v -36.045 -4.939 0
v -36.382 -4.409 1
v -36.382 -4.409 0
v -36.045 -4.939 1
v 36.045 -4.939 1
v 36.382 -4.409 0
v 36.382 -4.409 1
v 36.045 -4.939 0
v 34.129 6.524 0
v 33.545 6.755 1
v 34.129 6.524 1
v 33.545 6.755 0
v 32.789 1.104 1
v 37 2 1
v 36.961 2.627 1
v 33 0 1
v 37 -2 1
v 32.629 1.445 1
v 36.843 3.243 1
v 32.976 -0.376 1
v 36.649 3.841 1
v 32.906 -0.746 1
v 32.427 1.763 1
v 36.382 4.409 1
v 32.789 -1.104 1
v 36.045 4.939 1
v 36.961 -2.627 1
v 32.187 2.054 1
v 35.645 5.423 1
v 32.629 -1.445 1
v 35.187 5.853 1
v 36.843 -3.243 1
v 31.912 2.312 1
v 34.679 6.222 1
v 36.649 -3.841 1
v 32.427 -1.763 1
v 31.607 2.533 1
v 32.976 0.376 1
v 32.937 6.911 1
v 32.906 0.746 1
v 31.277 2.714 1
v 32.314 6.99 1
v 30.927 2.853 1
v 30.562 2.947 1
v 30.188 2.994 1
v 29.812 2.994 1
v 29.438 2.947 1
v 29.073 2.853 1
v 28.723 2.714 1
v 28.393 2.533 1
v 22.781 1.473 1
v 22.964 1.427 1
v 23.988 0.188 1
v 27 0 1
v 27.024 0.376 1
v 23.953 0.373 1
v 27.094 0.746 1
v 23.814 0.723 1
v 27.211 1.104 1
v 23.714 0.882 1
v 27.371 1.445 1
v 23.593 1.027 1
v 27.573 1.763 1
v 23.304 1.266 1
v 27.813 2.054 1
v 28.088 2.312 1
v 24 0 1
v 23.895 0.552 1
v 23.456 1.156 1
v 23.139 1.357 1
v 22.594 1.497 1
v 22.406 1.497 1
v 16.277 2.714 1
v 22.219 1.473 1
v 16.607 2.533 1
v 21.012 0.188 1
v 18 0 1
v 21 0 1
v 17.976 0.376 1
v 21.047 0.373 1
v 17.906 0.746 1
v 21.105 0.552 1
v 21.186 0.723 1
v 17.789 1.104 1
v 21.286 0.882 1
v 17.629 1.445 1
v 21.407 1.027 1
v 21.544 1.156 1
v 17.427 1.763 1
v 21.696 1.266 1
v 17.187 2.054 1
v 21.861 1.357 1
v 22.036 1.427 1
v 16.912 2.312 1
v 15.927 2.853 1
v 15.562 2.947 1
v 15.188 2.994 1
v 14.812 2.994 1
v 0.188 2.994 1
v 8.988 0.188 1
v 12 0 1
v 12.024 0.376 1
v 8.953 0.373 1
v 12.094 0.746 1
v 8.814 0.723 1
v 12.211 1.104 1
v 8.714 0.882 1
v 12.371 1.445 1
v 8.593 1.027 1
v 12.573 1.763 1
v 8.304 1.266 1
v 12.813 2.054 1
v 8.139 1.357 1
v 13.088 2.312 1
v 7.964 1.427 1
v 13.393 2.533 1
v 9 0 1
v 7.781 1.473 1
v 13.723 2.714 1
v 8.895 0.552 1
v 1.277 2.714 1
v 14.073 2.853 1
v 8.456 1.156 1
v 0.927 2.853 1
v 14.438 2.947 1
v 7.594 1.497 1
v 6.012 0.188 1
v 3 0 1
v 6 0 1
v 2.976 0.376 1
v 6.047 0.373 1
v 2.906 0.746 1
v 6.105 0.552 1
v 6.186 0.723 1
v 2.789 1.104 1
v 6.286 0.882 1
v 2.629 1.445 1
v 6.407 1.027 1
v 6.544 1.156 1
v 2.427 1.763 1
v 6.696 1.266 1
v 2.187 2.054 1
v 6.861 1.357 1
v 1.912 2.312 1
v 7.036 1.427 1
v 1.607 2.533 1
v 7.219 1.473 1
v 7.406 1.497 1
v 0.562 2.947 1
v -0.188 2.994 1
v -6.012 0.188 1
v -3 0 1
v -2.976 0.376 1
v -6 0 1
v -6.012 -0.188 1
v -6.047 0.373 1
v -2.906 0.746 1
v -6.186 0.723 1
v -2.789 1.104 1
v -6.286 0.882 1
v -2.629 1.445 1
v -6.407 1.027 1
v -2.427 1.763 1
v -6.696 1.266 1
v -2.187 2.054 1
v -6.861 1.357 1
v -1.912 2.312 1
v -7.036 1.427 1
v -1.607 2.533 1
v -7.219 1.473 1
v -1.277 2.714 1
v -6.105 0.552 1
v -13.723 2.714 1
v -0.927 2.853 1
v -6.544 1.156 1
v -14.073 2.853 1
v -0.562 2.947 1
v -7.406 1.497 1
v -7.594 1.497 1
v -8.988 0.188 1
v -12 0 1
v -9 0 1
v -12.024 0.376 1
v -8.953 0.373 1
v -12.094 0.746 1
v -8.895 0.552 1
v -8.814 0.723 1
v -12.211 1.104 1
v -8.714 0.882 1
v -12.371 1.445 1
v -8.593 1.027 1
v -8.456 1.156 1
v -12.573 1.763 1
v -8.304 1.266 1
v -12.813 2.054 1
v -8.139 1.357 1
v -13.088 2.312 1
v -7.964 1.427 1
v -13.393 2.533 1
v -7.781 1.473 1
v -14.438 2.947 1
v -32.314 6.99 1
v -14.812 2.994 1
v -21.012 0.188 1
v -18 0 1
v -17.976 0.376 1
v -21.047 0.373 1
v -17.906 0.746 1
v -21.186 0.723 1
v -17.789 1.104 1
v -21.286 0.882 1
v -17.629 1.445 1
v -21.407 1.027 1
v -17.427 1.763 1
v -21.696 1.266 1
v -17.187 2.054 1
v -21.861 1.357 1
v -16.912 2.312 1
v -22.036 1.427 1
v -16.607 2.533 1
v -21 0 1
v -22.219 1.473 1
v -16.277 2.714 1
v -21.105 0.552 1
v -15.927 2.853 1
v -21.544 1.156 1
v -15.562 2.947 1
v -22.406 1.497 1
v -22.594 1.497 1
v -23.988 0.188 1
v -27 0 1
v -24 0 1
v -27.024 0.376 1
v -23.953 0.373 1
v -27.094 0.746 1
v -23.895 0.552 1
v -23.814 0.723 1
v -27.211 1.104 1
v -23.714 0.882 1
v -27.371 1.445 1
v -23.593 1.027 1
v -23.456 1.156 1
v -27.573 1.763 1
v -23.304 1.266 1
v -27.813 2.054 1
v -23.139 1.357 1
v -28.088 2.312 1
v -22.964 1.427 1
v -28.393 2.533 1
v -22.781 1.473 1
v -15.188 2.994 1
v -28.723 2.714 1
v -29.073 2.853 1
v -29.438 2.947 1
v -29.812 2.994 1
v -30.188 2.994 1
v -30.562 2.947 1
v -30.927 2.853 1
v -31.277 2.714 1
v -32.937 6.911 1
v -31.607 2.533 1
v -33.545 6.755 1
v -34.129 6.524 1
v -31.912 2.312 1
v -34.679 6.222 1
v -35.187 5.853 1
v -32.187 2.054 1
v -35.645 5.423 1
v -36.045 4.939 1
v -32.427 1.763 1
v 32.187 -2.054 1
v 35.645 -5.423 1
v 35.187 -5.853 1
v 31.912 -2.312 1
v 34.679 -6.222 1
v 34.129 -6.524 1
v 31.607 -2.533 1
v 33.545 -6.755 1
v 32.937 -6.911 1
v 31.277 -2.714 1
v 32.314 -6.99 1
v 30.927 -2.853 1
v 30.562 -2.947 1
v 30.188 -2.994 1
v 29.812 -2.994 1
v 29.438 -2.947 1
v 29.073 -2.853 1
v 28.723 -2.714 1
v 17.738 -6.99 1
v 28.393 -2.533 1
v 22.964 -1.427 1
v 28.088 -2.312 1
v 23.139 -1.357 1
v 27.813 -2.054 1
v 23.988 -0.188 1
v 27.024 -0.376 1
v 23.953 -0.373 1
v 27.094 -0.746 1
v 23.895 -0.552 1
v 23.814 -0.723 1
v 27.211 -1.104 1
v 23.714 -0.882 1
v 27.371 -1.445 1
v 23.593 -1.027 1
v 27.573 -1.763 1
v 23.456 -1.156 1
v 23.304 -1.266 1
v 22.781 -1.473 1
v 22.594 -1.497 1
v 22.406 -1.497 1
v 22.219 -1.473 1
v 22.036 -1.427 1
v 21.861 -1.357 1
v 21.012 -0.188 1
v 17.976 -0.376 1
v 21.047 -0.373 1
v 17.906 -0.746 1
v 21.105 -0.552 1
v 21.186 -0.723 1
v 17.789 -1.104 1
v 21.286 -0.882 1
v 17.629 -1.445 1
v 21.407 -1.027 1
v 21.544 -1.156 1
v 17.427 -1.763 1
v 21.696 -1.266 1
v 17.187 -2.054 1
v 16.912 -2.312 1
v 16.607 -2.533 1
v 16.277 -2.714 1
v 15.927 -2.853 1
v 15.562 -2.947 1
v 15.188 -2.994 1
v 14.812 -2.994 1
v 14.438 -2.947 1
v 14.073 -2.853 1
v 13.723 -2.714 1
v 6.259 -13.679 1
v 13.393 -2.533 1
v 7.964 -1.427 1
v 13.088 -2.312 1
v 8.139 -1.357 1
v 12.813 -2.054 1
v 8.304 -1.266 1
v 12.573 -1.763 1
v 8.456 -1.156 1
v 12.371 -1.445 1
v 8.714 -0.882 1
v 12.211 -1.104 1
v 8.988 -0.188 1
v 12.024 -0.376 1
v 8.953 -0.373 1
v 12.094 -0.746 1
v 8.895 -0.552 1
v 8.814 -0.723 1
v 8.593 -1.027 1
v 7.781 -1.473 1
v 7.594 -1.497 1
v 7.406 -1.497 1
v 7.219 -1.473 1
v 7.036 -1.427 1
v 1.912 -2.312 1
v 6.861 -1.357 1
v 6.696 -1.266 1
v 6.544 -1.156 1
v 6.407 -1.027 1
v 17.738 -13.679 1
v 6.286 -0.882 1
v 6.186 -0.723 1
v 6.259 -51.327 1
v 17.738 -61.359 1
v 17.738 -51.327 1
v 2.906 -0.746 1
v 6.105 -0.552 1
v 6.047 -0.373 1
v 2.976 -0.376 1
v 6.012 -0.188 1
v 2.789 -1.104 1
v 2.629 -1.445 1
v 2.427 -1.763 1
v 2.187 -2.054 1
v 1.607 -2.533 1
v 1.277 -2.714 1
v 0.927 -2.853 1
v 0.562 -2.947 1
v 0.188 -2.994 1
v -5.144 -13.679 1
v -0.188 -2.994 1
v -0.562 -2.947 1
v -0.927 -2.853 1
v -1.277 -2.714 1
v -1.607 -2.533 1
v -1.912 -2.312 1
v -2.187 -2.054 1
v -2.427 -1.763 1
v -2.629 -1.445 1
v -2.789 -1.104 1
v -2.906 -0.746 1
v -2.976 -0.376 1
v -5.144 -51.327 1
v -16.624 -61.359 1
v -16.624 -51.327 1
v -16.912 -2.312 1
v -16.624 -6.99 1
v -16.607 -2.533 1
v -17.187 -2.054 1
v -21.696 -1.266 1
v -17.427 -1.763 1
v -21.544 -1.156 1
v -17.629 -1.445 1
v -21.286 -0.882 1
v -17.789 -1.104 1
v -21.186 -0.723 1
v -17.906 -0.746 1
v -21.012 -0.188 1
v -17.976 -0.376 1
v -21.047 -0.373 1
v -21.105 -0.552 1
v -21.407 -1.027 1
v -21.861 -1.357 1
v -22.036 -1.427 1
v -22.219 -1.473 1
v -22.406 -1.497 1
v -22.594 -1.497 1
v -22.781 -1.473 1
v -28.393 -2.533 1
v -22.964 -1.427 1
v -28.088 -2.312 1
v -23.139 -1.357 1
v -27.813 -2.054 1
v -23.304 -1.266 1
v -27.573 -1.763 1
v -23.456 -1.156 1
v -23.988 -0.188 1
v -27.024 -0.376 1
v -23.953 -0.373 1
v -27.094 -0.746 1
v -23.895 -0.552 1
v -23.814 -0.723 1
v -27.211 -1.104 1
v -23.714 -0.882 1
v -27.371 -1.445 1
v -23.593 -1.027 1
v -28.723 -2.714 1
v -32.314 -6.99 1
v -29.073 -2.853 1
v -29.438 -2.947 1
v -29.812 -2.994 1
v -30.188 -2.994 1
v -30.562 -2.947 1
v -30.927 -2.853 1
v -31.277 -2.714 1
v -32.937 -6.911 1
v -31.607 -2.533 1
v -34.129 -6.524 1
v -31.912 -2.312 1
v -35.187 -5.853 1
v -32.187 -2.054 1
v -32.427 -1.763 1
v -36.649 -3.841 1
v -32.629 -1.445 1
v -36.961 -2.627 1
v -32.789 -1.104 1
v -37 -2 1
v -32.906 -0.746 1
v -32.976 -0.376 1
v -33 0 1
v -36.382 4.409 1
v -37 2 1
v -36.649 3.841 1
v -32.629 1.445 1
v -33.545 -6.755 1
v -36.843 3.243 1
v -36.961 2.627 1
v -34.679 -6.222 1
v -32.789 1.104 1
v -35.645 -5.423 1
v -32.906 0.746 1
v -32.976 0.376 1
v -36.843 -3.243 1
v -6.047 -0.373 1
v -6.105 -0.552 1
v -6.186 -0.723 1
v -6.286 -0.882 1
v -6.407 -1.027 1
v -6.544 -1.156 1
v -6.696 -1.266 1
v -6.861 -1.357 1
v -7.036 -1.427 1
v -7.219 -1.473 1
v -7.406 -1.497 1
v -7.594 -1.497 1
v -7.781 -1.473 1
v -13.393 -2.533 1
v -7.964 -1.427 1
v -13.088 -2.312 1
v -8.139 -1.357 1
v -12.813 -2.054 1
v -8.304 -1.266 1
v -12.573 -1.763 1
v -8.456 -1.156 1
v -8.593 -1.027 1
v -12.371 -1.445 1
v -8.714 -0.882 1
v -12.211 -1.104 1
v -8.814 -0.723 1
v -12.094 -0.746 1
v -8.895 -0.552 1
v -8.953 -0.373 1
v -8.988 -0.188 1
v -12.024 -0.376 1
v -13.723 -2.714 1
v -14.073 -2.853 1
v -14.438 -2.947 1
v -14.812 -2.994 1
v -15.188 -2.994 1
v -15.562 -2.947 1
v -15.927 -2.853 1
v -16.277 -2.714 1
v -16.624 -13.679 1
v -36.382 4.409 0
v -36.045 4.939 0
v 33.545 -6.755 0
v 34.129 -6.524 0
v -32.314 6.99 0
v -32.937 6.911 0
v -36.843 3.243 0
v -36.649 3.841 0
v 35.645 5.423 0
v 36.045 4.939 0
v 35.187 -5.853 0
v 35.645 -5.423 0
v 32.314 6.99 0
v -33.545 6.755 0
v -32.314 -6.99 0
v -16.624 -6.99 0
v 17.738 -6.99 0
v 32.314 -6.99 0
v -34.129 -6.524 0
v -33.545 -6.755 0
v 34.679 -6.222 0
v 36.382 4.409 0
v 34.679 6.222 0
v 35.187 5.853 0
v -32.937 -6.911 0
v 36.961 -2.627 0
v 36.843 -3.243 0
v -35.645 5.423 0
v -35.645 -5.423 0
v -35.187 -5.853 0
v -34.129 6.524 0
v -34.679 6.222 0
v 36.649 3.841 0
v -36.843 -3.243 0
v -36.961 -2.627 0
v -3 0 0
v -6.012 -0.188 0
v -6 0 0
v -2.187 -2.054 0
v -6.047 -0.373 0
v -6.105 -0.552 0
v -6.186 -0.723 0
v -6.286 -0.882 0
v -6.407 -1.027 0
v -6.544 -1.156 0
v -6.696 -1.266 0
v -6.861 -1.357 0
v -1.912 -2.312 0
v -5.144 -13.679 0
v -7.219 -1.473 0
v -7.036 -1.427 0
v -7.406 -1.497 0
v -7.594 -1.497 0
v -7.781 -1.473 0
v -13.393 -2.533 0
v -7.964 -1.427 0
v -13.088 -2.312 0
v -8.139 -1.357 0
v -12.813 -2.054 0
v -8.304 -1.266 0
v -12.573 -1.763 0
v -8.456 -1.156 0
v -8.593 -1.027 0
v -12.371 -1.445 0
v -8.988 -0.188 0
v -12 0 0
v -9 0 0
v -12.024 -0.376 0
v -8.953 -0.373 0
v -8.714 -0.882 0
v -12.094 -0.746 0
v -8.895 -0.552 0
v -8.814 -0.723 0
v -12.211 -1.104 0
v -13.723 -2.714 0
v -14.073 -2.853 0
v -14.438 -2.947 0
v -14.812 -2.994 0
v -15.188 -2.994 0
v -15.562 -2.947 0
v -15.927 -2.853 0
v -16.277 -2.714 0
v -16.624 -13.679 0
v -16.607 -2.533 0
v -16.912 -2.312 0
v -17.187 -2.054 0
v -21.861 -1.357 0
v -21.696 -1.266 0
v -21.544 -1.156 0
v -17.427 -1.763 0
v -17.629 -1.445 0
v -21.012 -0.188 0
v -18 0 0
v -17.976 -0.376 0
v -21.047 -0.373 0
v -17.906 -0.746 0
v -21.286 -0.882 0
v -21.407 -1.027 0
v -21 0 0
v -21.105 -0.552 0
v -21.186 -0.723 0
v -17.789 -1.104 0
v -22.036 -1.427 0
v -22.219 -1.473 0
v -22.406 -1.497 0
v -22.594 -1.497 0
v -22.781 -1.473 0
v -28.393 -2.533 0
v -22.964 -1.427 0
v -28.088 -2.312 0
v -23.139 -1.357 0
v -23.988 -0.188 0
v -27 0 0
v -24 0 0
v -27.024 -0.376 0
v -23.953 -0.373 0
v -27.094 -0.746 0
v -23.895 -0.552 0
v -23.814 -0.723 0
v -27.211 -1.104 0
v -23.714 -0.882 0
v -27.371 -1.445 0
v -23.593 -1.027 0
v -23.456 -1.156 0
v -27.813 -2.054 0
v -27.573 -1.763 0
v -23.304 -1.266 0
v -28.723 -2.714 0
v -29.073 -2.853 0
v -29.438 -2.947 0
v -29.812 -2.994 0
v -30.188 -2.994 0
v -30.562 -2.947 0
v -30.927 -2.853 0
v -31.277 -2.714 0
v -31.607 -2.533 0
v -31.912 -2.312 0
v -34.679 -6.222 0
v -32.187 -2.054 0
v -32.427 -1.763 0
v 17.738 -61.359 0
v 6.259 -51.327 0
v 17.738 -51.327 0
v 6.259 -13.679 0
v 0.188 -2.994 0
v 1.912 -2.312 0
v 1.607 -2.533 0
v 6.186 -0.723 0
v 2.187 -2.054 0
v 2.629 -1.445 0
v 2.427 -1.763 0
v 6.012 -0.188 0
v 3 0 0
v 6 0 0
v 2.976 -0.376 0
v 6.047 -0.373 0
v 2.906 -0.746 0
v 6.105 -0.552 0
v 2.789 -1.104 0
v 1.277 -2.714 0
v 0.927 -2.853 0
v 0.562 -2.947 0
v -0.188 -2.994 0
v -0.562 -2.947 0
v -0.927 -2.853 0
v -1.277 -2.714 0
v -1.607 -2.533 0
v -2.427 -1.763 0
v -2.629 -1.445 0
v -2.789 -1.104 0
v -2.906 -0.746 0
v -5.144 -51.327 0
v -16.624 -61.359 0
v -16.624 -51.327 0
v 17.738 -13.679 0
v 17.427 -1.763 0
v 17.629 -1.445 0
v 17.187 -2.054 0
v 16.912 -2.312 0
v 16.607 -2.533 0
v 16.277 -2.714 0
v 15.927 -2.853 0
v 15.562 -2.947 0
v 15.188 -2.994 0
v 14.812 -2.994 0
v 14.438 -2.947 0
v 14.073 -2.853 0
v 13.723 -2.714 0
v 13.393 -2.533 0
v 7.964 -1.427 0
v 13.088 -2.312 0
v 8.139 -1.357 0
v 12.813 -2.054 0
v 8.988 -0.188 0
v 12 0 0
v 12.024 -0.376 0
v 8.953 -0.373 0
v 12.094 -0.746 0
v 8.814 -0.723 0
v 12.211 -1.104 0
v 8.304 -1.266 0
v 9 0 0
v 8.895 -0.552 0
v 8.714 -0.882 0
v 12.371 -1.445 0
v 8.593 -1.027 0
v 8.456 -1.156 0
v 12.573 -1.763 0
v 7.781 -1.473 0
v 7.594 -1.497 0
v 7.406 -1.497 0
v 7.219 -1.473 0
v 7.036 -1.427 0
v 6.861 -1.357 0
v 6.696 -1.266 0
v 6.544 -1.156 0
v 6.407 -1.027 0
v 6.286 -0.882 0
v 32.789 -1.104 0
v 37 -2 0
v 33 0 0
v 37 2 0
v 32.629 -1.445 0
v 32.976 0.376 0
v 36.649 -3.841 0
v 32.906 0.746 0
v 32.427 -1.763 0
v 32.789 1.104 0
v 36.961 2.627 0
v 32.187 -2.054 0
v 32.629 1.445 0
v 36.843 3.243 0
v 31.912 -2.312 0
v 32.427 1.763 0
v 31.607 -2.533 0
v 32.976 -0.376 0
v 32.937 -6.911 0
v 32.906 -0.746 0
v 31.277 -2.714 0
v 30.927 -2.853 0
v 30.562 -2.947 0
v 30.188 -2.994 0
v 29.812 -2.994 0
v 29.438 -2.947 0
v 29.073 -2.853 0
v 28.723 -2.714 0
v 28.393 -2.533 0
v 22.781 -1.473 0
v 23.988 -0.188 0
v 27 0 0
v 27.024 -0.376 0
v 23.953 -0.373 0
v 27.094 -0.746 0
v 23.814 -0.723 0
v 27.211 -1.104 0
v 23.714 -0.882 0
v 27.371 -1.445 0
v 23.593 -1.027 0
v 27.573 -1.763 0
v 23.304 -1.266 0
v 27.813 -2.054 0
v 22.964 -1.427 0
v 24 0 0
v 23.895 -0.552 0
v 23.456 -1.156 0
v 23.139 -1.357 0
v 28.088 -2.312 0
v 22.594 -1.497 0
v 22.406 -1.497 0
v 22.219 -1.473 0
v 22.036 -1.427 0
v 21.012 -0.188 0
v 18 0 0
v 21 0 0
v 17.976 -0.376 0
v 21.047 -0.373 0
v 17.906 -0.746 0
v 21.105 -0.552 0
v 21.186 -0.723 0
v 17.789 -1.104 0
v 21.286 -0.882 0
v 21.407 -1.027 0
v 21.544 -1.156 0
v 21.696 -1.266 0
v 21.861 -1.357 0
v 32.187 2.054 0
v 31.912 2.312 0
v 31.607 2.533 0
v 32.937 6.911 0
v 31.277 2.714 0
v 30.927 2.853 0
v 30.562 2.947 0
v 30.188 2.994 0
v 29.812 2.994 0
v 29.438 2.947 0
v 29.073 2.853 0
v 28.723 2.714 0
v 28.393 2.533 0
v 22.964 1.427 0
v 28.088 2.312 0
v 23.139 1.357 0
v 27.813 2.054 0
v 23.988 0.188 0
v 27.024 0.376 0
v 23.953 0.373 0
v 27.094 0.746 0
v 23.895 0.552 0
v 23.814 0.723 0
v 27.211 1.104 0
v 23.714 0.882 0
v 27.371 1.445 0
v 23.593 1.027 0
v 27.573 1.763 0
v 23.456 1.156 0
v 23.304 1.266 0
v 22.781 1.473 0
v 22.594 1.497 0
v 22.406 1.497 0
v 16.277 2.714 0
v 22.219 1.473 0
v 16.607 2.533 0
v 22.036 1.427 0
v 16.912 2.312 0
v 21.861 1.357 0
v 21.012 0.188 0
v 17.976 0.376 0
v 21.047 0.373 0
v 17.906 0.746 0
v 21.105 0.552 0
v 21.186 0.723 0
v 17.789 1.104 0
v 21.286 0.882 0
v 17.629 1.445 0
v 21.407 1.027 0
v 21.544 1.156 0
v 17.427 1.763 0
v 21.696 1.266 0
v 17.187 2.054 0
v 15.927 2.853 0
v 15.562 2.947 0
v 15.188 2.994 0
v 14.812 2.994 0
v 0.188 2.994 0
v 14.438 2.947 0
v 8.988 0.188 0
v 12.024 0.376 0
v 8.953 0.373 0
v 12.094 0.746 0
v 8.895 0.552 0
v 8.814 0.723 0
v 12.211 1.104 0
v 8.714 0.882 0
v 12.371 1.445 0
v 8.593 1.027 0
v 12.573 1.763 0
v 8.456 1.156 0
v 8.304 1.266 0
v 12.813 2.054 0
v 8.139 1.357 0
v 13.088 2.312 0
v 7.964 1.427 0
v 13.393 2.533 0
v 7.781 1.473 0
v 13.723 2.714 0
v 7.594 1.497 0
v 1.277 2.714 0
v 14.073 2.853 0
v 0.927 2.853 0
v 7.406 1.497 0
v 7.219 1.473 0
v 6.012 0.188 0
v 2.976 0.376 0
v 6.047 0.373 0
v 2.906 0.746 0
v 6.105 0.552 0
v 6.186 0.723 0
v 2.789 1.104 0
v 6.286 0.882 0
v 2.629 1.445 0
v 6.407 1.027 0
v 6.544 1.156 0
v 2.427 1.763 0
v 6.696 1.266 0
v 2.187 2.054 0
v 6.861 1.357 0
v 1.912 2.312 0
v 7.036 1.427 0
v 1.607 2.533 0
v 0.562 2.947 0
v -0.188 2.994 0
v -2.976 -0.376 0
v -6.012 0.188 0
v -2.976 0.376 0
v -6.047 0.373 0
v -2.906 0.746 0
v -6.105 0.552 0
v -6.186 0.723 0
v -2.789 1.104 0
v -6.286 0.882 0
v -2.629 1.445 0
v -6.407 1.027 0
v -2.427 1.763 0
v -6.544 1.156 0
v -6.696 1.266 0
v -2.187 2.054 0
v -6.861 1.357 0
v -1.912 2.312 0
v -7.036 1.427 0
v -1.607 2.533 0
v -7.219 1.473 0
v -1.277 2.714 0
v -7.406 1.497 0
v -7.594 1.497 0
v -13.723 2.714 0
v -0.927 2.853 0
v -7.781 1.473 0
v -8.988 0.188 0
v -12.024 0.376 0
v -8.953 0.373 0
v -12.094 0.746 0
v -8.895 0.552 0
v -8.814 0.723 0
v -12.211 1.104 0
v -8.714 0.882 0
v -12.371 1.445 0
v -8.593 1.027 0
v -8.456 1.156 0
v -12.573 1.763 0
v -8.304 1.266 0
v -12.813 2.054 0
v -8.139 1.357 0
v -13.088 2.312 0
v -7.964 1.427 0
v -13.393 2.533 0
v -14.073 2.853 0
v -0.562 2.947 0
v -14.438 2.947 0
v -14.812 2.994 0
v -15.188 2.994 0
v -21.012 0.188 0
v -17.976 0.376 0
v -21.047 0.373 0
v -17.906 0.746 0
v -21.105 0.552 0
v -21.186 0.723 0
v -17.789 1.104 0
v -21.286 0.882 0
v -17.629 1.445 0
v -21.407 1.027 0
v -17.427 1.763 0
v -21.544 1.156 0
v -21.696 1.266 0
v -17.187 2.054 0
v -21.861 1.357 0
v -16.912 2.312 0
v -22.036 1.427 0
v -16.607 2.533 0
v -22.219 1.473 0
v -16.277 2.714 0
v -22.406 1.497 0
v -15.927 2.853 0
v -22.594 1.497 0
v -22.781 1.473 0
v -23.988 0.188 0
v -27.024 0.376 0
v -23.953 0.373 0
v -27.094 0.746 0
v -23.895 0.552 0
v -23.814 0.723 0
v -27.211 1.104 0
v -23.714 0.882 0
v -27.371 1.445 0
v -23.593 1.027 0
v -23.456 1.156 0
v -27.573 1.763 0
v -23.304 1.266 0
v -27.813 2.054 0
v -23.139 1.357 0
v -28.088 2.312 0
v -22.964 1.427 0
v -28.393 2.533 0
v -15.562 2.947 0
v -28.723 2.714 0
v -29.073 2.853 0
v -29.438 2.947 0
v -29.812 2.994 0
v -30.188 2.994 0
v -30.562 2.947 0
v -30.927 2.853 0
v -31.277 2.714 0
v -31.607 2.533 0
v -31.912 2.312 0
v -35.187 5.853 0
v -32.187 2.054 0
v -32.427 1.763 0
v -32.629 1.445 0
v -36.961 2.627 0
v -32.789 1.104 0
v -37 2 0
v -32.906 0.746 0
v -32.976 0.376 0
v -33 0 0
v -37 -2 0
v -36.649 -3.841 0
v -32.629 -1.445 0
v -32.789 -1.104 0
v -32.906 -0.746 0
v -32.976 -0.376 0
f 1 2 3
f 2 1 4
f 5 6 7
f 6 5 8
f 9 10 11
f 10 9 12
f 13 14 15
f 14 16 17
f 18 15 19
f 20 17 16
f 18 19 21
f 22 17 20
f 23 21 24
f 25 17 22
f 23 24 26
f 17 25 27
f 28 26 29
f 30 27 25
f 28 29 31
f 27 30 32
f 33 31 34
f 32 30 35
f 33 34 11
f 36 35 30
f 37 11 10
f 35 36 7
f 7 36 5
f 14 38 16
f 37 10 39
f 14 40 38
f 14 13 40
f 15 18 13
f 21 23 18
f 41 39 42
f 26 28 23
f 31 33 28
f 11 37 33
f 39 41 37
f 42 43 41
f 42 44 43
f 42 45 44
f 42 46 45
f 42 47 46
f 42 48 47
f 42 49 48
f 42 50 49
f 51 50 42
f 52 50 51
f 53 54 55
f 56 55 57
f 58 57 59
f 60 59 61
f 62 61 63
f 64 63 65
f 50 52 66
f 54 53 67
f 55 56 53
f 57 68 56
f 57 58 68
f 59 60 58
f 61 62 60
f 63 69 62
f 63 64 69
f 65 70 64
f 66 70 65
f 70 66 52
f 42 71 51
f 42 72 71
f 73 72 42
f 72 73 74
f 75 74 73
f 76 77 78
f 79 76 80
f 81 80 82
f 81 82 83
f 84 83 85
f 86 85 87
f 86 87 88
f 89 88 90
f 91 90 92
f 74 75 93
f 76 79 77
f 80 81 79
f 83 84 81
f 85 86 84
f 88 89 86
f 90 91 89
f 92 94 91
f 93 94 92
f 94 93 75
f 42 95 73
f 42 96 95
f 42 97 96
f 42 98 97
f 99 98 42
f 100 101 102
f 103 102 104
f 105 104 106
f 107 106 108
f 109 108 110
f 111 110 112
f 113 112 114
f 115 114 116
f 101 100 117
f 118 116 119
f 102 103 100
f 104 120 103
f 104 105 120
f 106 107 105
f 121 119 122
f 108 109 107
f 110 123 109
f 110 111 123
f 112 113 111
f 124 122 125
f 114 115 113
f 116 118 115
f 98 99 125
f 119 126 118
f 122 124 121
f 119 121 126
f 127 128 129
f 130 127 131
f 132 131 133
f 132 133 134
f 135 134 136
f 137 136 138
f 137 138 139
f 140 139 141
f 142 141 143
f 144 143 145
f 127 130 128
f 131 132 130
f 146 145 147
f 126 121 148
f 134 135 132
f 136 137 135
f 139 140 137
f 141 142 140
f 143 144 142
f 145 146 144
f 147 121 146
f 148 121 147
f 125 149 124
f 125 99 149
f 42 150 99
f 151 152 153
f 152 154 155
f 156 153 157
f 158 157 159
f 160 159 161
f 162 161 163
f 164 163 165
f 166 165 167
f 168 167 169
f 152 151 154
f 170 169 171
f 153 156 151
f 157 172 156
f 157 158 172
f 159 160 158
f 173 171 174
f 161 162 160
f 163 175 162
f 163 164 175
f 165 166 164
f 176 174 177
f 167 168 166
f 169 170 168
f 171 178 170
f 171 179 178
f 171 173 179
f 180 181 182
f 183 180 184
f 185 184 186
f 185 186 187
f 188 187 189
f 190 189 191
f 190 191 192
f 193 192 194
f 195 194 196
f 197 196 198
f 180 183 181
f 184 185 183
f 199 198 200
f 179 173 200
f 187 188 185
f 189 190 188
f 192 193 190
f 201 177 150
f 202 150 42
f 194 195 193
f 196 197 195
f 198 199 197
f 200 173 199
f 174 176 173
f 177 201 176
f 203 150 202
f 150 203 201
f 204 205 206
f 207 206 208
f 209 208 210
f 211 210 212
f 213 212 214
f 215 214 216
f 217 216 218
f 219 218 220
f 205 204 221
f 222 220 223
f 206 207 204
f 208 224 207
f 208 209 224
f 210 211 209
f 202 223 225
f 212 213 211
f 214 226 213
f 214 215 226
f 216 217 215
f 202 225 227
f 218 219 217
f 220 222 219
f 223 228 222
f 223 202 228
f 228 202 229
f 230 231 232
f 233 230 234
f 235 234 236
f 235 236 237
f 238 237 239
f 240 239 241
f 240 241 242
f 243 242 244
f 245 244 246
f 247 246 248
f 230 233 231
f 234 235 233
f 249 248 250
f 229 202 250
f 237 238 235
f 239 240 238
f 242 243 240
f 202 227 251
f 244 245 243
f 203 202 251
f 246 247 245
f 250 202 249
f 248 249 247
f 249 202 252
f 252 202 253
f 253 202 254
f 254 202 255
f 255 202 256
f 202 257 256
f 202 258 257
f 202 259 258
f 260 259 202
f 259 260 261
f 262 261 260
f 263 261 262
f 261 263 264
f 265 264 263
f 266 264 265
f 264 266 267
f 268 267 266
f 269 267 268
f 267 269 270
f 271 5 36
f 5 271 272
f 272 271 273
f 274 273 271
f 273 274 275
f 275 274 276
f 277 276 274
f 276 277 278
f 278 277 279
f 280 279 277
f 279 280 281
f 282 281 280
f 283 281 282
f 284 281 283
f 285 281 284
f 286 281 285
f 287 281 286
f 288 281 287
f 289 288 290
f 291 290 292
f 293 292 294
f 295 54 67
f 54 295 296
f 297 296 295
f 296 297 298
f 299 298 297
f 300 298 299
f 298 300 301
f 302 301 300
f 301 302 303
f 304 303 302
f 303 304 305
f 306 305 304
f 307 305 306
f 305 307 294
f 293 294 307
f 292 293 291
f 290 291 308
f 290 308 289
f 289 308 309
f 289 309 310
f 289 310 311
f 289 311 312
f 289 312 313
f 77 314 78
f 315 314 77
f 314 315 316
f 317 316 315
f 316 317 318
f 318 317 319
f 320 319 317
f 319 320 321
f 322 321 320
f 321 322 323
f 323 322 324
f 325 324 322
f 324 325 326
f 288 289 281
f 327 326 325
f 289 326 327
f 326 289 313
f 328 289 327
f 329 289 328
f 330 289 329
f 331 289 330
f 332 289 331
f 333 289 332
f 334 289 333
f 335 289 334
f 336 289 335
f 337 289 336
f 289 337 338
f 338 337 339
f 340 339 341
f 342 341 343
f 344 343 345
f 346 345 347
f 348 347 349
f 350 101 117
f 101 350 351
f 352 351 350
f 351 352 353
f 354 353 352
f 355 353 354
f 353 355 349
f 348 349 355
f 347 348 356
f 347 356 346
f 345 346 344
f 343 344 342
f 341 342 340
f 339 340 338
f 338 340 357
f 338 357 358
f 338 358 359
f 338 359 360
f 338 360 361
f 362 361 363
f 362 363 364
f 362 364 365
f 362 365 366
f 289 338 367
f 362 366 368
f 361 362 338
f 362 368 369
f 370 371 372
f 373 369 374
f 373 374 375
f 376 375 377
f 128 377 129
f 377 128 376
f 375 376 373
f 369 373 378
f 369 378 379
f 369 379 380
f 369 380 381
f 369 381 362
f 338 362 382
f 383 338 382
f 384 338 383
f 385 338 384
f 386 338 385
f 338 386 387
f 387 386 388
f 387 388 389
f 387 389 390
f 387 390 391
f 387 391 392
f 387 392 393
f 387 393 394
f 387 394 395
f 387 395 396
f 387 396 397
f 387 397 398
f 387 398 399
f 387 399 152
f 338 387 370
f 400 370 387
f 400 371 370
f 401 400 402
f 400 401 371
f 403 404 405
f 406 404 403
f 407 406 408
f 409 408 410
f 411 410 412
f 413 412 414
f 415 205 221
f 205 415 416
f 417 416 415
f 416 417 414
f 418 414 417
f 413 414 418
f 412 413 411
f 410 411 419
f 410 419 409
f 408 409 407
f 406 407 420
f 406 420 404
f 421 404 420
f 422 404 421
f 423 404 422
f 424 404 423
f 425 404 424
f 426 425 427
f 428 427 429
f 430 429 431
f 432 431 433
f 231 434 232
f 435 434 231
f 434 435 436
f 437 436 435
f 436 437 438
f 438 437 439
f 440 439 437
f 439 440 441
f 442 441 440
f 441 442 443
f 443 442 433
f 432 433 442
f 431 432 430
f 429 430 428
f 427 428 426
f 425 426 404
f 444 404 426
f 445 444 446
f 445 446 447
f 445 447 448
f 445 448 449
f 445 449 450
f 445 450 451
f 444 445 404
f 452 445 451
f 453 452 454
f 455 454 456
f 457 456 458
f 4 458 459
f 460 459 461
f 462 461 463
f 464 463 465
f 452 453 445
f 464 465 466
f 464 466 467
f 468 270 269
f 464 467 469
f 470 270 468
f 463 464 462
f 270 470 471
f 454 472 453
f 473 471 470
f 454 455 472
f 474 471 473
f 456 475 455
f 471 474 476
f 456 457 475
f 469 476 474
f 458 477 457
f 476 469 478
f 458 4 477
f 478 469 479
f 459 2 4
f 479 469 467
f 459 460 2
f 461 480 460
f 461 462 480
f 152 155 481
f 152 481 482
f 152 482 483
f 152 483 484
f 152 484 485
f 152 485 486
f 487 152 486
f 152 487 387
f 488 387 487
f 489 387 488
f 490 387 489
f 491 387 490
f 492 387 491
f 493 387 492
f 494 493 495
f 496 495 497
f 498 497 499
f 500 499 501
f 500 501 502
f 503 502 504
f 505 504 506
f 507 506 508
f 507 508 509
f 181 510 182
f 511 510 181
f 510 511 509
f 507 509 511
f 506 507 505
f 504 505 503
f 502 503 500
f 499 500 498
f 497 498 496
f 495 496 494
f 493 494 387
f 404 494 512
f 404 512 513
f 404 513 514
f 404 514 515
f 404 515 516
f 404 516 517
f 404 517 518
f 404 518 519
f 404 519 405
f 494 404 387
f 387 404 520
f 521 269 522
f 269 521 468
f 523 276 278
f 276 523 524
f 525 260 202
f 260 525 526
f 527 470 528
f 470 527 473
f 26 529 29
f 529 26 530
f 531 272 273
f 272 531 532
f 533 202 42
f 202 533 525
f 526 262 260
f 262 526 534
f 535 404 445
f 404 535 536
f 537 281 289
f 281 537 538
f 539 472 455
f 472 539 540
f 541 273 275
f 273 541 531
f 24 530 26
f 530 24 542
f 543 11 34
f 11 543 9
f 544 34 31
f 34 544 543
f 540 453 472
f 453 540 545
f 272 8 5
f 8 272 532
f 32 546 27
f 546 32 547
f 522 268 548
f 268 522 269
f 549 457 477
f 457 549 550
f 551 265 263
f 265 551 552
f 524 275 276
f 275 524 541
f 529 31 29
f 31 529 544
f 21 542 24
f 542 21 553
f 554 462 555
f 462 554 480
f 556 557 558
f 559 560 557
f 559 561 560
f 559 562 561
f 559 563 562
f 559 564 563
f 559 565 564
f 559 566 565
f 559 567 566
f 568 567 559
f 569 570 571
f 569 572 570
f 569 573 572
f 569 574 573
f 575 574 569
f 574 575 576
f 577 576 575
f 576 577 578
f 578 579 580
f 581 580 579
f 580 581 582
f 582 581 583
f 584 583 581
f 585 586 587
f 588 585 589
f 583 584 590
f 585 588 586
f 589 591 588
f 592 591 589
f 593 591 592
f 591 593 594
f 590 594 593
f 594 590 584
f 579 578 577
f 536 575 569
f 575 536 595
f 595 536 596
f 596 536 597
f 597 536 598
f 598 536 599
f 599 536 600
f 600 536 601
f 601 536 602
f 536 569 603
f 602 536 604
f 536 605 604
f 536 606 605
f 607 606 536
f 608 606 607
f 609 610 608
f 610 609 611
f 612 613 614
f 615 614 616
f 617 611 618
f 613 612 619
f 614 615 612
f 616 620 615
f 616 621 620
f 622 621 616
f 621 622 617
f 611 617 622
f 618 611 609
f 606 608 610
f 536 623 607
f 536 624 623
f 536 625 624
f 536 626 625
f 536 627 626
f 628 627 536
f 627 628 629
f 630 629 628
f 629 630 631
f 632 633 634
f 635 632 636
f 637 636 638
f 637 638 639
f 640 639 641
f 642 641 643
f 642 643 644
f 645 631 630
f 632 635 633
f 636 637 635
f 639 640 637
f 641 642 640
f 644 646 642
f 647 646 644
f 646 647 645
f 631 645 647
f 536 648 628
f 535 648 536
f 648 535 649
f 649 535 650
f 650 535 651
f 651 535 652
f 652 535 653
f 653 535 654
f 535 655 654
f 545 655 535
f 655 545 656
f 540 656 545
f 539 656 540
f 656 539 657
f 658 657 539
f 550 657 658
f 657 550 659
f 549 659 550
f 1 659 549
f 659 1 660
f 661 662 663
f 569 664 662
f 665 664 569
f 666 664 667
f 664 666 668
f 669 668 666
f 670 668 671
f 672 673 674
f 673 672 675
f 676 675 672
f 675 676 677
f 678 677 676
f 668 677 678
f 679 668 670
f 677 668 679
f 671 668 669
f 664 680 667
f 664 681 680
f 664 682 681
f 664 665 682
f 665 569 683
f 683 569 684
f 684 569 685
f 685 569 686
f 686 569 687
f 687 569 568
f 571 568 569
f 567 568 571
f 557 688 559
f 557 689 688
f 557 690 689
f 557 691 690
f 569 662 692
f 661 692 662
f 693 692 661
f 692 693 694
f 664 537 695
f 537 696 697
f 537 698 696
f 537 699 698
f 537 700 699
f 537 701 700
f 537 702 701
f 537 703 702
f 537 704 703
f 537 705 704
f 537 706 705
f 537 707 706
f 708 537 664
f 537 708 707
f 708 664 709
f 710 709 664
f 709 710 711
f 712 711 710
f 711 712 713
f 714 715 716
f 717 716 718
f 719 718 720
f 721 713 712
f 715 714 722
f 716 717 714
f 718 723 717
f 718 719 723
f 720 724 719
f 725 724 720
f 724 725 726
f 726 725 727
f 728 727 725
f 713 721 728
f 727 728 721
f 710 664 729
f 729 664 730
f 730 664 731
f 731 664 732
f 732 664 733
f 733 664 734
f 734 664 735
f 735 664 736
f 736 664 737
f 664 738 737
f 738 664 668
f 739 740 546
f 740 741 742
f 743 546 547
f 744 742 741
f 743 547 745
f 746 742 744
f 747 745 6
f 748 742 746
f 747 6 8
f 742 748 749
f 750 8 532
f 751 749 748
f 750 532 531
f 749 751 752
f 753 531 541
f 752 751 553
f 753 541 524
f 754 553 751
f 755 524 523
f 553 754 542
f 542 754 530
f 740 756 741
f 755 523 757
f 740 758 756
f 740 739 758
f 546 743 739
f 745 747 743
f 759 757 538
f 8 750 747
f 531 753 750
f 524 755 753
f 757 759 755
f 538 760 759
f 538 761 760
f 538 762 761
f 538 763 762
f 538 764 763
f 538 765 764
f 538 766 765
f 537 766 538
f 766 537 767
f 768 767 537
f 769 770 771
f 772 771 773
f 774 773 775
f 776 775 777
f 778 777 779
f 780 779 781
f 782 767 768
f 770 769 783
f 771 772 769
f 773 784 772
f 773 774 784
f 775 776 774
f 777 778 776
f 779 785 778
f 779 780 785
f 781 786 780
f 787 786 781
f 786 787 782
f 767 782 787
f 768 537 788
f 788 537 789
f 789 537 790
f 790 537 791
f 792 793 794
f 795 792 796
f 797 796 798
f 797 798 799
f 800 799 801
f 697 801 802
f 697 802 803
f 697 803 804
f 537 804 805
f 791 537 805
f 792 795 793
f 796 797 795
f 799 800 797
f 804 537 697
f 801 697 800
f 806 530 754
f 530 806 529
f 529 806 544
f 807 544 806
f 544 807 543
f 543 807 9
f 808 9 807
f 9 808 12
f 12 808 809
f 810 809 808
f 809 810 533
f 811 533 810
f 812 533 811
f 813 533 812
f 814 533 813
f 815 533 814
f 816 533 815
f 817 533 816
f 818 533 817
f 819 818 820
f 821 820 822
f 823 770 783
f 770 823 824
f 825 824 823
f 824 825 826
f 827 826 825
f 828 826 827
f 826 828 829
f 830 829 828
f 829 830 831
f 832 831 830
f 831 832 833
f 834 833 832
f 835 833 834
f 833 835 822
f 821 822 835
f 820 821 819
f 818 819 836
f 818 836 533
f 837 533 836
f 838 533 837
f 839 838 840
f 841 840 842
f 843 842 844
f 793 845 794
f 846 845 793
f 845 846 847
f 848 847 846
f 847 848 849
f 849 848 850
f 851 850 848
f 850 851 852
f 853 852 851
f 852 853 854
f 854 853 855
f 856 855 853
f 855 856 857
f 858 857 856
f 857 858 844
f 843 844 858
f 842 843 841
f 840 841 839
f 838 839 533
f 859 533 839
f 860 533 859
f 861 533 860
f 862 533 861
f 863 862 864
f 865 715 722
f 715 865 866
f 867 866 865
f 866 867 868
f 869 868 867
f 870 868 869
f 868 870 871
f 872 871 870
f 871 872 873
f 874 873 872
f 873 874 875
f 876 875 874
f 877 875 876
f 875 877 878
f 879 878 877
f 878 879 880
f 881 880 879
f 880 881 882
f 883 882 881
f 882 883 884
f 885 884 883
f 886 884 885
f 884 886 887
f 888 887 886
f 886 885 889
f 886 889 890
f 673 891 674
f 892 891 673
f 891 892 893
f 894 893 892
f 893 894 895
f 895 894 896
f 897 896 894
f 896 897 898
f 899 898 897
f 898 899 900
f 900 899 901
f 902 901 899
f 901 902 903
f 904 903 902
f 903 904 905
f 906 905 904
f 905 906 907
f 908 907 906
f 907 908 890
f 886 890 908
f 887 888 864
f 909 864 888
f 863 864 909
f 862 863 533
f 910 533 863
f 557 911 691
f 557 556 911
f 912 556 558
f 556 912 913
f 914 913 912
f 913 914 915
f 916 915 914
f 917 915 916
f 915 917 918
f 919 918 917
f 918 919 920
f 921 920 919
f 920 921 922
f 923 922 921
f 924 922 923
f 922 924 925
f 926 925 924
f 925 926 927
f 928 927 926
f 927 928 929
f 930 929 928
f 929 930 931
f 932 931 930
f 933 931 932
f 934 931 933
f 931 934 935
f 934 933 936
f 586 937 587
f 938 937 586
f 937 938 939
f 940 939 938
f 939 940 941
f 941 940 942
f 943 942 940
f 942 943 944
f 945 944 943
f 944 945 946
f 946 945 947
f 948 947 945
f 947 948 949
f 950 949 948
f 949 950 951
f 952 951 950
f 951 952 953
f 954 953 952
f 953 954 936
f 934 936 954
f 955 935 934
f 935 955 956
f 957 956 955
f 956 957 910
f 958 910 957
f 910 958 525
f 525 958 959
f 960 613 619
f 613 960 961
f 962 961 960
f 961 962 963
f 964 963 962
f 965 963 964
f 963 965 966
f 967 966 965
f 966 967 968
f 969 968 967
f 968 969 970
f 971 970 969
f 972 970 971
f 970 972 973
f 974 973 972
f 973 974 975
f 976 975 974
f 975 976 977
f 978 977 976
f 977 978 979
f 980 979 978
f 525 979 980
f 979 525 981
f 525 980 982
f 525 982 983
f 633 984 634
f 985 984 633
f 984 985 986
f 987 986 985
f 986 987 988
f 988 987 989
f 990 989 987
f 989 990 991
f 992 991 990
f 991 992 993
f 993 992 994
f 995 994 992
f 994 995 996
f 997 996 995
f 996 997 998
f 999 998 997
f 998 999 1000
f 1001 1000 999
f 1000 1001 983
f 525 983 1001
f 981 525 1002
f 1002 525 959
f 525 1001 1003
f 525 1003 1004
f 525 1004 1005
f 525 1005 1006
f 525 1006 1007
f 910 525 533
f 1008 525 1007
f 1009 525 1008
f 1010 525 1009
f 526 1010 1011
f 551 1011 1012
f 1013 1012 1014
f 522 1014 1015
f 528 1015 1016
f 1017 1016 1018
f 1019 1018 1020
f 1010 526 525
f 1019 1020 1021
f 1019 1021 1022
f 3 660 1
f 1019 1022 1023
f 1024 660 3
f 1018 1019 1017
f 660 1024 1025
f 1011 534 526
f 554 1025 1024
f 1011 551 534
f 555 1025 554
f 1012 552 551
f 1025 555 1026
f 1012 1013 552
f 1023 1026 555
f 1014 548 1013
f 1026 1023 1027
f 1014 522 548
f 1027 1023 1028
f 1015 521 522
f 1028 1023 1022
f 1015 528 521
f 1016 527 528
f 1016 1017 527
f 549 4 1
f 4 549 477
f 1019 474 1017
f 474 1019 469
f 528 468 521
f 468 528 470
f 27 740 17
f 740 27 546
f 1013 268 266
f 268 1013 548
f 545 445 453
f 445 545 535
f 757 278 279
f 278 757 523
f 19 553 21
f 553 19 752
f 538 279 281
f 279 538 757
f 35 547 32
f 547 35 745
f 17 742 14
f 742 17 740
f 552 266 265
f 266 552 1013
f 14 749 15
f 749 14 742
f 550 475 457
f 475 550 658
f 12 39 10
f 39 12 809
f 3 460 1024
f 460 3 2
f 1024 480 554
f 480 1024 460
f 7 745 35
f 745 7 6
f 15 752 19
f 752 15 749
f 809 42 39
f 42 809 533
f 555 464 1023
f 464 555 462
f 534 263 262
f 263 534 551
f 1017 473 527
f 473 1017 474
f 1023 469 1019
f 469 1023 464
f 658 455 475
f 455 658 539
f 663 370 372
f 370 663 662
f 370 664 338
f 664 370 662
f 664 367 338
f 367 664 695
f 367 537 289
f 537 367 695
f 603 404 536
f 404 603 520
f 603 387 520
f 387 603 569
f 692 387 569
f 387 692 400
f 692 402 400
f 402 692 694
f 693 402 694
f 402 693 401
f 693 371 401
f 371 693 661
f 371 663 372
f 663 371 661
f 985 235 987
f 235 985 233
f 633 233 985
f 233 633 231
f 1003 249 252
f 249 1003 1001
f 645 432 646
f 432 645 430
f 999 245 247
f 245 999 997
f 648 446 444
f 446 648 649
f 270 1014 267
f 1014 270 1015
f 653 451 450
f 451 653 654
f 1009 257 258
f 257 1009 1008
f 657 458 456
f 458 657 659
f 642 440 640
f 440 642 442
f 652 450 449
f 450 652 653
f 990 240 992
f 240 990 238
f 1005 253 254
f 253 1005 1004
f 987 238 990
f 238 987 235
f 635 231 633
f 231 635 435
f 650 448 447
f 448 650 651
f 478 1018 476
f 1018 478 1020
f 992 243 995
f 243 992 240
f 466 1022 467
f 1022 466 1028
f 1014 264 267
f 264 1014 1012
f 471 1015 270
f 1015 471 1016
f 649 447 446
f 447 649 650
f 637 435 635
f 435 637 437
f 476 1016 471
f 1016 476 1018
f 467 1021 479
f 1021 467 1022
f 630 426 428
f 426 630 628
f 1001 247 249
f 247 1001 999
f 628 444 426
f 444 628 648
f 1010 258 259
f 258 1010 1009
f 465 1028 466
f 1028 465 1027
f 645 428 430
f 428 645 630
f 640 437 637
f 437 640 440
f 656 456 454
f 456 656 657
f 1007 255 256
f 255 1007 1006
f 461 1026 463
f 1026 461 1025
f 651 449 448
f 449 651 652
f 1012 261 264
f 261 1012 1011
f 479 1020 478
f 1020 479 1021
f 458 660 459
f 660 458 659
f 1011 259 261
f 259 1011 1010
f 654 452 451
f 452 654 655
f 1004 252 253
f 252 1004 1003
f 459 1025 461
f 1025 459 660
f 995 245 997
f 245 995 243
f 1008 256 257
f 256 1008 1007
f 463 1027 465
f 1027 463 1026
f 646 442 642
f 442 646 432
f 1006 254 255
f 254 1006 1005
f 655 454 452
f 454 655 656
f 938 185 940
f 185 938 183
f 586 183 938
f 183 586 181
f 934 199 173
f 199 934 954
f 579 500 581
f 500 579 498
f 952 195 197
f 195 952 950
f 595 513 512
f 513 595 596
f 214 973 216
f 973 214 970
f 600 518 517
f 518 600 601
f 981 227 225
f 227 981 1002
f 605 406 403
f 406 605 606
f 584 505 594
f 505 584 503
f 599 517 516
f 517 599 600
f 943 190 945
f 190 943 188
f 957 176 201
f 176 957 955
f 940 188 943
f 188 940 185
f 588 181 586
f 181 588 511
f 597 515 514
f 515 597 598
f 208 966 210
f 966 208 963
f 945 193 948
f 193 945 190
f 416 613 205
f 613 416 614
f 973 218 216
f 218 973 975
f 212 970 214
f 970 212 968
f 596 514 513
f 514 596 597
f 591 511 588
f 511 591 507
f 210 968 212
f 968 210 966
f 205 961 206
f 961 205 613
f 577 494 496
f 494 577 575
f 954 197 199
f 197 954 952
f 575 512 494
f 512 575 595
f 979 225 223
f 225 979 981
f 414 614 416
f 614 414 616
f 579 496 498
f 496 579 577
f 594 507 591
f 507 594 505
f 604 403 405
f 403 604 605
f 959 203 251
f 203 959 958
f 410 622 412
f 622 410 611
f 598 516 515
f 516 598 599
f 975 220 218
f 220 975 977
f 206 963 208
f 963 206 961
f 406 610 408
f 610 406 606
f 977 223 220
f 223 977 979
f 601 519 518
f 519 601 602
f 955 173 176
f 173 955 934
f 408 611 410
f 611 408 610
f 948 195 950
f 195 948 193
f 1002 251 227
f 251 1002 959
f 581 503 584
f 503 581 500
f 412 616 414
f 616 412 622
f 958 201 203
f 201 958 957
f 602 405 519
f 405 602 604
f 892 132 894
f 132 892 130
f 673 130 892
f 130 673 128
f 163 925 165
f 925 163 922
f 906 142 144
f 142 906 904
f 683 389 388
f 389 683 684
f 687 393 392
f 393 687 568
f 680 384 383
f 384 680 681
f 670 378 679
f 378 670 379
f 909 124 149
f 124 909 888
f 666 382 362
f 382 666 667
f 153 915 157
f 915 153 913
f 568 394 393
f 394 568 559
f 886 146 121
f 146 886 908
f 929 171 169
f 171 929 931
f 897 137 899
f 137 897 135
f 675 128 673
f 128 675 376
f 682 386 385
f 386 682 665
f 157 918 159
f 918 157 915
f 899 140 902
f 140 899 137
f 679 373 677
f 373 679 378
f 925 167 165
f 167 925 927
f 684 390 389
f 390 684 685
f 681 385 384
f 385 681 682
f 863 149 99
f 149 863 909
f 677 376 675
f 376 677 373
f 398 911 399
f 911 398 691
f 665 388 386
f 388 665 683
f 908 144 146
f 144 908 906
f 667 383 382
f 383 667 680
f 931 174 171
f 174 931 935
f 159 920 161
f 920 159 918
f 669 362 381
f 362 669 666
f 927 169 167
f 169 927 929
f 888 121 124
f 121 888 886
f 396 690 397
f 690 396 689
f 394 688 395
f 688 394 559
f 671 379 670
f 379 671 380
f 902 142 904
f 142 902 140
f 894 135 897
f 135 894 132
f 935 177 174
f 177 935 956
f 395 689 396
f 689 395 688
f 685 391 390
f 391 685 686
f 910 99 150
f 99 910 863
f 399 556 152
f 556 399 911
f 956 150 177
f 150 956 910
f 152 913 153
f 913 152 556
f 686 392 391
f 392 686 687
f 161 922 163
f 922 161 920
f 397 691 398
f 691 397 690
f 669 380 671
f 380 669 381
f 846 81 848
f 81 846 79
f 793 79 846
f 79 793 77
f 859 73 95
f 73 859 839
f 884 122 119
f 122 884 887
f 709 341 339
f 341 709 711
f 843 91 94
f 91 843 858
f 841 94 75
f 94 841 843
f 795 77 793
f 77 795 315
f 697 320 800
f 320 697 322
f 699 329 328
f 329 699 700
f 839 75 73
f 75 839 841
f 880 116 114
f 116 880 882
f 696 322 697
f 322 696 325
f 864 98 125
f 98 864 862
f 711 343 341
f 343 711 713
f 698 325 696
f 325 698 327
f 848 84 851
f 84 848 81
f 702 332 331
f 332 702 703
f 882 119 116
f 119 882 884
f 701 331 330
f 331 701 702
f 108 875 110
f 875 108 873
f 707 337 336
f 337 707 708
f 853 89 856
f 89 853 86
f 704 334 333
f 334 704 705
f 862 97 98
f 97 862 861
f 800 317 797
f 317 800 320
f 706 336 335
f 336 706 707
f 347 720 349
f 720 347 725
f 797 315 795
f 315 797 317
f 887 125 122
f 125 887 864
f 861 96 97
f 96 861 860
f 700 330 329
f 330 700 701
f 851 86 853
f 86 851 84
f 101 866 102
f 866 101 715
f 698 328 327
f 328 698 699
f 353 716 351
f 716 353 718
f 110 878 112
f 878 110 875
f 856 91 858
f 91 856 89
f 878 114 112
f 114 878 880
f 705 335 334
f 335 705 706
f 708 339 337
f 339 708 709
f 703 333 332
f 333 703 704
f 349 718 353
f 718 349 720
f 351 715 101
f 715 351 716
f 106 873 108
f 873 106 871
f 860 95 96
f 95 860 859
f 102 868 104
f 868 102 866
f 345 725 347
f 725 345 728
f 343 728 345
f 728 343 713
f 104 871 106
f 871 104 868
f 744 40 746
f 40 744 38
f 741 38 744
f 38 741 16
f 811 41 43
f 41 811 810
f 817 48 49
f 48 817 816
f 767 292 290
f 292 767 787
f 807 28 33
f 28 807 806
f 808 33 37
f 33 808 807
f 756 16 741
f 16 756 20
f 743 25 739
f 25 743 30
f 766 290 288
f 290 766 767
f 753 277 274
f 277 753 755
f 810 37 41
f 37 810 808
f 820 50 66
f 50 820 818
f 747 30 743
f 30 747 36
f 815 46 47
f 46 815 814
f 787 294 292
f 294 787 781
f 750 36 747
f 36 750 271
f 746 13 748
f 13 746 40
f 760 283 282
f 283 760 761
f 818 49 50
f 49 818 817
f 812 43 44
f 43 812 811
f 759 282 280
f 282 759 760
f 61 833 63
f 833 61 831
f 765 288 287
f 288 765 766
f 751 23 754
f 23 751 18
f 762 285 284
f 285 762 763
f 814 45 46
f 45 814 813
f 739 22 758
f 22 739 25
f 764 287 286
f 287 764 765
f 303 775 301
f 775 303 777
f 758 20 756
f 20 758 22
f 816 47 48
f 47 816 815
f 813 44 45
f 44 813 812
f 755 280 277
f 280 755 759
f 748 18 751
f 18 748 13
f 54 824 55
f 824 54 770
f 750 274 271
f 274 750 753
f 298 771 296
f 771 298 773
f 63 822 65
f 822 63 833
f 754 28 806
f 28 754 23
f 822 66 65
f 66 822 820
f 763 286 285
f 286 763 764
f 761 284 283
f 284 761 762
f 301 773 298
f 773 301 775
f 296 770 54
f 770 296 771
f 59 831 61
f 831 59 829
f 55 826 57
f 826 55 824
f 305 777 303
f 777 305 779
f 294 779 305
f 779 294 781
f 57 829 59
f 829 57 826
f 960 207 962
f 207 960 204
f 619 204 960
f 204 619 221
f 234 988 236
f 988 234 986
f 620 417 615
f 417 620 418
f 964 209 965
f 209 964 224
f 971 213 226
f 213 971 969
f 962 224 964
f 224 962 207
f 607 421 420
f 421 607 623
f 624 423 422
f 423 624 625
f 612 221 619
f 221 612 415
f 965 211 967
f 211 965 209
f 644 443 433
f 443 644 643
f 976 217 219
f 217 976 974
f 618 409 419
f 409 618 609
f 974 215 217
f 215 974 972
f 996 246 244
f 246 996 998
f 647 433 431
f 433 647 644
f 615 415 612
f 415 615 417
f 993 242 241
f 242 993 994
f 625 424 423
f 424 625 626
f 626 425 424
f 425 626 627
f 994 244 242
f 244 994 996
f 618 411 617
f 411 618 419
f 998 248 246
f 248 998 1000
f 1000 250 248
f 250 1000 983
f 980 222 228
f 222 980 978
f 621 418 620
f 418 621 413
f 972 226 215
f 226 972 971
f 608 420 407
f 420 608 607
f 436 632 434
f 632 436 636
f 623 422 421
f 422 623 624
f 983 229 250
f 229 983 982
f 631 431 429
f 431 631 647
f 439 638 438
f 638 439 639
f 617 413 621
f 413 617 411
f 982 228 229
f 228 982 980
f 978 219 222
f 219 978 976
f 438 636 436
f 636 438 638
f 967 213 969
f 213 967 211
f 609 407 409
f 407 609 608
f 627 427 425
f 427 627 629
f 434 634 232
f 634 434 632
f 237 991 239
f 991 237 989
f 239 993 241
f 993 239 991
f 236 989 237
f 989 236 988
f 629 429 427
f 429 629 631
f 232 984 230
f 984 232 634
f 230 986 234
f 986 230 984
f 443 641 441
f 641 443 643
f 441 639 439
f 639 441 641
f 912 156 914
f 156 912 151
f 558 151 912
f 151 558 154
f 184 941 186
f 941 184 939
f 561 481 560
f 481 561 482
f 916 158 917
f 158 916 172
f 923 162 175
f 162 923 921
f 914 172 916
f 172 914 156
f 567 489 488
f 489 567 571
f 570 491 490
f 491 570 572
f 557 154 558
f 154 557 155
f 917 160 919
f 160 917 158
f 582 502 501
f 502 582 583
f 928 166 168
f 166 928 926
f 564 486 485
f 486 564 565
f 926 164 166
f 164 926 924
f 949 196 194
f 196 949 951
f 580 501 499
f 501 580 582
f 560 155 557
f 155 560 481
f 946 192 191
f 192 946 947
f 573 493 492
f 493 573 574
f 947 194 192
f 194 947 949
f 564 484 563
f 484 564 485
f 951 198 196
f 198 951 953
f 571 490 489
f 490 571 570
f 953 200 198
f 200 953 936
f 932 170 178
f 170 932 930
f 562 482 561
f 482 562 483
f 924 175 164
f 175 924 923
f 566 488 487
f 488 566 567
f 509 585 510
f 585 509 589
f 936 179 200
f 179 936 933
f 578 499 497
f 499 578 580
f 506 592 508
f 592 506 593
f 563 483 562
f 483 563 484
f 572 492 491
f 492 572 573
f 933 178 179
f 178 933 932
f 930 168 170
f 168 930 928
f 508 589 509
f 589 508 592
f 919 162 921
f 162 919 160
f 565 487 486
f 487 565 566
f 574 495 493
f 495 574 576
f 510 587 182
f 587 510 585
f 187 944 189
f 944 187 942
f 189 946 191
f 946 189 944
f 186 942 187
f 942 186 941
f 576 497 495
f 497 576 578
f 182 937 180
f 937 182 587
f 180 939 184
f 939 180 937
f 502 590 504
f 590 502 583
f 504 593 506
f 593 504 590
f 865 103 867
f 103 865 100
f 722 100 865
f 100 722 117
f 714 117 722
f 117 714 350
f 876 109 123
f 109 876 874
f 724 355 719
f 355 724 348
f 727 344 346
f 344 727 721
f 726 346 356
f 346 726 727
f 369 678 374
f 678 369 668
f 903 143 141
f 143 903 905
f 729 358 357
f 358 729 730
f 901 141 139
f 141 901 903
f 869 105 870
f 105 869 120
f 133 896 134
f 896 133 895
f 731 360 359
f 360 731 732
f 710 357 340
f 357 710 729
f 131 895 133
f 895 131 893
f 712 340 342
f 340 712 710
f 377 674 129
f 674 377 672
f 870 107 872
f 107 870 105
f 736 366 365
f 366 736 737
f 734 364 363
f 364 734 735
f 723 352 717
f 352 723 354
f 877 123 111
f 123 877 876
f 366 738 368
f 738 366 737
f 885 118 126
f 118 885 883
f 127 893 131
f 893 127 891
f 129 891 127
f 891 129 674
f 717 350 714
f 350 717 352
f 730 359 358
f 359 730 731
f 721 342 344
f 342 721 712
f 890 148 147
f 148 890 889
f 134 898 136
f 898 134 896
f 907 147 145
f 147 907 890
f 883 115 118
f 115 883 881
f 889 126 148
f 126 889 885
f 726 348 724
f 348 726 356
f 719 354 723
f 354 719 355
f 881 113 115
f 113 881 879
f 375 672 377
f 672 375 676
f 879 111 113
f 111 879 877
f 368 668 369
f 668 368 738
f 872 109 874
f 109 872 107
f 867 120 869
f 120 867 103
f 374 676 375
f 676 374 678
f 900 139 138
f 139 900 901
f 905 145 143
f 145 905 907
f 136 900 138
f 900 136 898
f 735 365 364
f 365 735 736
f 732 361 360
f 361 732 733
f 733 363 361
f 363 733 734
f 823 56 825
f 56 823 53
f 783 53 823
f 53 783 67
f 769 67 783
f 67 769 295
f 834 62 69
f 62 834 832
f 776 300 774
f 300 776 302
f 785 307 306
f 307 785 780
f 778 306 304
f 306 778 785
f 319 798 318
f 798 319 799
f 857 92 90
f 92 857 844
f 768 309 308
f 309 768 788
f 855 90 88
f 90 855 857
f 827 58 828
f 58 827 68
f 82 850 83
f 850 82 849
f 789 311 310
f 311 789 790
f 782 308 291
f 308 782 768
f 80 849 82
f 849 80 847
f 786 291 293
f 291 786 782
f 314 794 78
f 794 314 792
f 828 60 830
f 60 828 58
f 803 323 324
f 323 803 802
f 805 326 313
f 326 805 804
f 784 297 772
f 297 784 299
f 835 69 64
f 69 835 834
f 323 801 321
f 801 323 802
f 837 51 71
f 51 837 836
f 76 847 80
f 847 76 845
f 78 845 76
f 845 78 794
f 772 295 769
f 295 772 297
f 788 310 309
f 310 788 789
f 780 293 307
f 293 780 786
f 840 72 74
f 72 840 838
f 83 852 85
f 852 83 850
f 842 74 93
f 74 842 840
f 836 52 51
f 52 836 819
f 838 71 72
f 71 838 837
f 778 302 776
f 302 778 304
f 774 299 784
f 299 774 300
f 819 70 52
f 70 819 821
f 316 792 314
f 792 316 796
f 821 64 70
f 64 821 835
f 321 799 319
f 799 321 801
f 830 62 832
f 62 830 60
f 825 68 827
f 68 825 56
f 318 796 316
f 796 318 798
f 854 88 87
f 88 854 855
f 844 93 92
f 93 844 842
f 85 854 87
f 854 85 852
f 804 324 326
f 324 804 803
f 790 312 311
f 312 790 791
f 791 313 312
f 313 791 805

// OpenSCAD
$fn = 50;


difference() {
	union() {
		*color(alpha = 1.0000000000, c = "gray") {
			translate(v = [0, 14, 0]) {
				linear_extrude(height = 1) {
					text(font = "Arial:style=Bold", halign = "center", size = 4.5000000000, text = "COMMENT description oobb_plate_shape_p_type_1_depth_5_width_1_thickness_i_extra_oobb_size", valign = "center");
				}
			}
		}
		hull() {
			translate(v = [-32.0000000000, 2.0000000000, 0]) {
				cylinder(h = 1, r = 5);
			}
			translate(v = [32.0000000000, 2.0000000000, 0]) {
				cylinder(h = 1, r = 5);
			}
			translate(v = [-32.0000000000, -2.0000000000, 0]) {
				cylinder(h = 1, r = 5);
			}
			translate(v = [32.0000000000, -2.0000000000, 0]) {
				cylinder(h = 1, r = 5);
			}
		}
		translate(v = [0, -5, 0]) {
			linear_extrude(height = 1) {
				text(font = "DejaVu Sans Mono:style=Bold", halign = "center", size = 57.0000000000, text = "I", valign = "top");
			}
		}
	}
	union() {
		*color(alpha = 1.0000000000, c = "gray") {
			translate(v = [0, 14, 0]) {
				linear_extrude(height = 1) {
					text(font = "Arial:style=Bold", halign = "center", size = 4.5000000000, text = "COMMENT description oobb_holes_shape_n_type_5_width_1_thickness_i_extra_oobb_size_1_height_'all'_holes_true_both_holes", valign = "center");
				}
			}
		}
		translate(v = [-30.0000000000, 0.0000000000, 0]) {
			translate(v = [0, 0, -50]) {
				cylinder(h = 100, r = 3.0000000000);
			}
		}
		translate(v = [-15.0000000000, 0.0000000000, 0]) {
			translate(v = [0, 0, -50]) {
				cylinder(h = 100, r = 3.0000000000);
			}
		}
		translate(v = [0, 0, -50]) {
			cylinder(h = 100, r = 3.0000000000);
		}
		translate(v = [15.0000000000, 0.0000000000, 0]) {
			translate(v = [0, 0, -50]) {
				cylinder(h = 100, r = 3.0000000000);
			}
		}
		translate(v = [30.0000000000, 0.0000000000, 0]) {
			translate(v = [0, 0, -50]) {
				cylinder(h = 100, r = 3.0000000000);
			}
		}
		translate(v = [-30.0000000000, 0.0000000000, 0]) {
			translate(v = [0, 0, -50]) {
				cylinder(h = 100, r = 1.5000000000);
			}
		}
		translate(v = [-22.5000000000, 0.0000000000, 0]) {
			translate(v = [0, 0, -50]) {
				cylinder(h = 100, r = 1.5000000000);
			}
		}
		translate(v = [-15.0000000000, 0.0000000000, 0]) {
			translate(v = [0, 0, -50]) {
				cylinder(h = 100, r = 1.5000000000);
			}
		}
		translate(v = [-7.5000000000, 0.0000000000, 0]) {
			translate(v = [0, 0, -50]) {
				cylinder(h = 100, r = 1.5000000000);
			}
		}
		translate(v = [0, 0, -50]) {
			cylinder(h = 100, r = 1.5000000000);
		}
		translate(v = [7.5000000000, 0.0000000000, 0]) {
			translate(v = [0, 0, -50]) {
				cylinder(h = 100, r = 1.5000000000);
			}
		}
		translate(v = [15.0000000000, 0.0000000000, 0]) {
			translate(v = [0, 0, -50]) {
				cylinder(h = 100, r = 1.5000000000);
			}
		}
		translate(v = [22.5000000000, 0.0000000000, 0]) {
			translate(v = [0, 0, -50]) {
				cylinder(h = 100, r = 1.5000000000);
			}
		}
		translate(v = [30.0000000000, 0.0000000000, 0]) {
			translate(v = [0, 0, -50]) {
				cylinder(h = 100, r = 1.5000000000);
			}
		}
	}
}
